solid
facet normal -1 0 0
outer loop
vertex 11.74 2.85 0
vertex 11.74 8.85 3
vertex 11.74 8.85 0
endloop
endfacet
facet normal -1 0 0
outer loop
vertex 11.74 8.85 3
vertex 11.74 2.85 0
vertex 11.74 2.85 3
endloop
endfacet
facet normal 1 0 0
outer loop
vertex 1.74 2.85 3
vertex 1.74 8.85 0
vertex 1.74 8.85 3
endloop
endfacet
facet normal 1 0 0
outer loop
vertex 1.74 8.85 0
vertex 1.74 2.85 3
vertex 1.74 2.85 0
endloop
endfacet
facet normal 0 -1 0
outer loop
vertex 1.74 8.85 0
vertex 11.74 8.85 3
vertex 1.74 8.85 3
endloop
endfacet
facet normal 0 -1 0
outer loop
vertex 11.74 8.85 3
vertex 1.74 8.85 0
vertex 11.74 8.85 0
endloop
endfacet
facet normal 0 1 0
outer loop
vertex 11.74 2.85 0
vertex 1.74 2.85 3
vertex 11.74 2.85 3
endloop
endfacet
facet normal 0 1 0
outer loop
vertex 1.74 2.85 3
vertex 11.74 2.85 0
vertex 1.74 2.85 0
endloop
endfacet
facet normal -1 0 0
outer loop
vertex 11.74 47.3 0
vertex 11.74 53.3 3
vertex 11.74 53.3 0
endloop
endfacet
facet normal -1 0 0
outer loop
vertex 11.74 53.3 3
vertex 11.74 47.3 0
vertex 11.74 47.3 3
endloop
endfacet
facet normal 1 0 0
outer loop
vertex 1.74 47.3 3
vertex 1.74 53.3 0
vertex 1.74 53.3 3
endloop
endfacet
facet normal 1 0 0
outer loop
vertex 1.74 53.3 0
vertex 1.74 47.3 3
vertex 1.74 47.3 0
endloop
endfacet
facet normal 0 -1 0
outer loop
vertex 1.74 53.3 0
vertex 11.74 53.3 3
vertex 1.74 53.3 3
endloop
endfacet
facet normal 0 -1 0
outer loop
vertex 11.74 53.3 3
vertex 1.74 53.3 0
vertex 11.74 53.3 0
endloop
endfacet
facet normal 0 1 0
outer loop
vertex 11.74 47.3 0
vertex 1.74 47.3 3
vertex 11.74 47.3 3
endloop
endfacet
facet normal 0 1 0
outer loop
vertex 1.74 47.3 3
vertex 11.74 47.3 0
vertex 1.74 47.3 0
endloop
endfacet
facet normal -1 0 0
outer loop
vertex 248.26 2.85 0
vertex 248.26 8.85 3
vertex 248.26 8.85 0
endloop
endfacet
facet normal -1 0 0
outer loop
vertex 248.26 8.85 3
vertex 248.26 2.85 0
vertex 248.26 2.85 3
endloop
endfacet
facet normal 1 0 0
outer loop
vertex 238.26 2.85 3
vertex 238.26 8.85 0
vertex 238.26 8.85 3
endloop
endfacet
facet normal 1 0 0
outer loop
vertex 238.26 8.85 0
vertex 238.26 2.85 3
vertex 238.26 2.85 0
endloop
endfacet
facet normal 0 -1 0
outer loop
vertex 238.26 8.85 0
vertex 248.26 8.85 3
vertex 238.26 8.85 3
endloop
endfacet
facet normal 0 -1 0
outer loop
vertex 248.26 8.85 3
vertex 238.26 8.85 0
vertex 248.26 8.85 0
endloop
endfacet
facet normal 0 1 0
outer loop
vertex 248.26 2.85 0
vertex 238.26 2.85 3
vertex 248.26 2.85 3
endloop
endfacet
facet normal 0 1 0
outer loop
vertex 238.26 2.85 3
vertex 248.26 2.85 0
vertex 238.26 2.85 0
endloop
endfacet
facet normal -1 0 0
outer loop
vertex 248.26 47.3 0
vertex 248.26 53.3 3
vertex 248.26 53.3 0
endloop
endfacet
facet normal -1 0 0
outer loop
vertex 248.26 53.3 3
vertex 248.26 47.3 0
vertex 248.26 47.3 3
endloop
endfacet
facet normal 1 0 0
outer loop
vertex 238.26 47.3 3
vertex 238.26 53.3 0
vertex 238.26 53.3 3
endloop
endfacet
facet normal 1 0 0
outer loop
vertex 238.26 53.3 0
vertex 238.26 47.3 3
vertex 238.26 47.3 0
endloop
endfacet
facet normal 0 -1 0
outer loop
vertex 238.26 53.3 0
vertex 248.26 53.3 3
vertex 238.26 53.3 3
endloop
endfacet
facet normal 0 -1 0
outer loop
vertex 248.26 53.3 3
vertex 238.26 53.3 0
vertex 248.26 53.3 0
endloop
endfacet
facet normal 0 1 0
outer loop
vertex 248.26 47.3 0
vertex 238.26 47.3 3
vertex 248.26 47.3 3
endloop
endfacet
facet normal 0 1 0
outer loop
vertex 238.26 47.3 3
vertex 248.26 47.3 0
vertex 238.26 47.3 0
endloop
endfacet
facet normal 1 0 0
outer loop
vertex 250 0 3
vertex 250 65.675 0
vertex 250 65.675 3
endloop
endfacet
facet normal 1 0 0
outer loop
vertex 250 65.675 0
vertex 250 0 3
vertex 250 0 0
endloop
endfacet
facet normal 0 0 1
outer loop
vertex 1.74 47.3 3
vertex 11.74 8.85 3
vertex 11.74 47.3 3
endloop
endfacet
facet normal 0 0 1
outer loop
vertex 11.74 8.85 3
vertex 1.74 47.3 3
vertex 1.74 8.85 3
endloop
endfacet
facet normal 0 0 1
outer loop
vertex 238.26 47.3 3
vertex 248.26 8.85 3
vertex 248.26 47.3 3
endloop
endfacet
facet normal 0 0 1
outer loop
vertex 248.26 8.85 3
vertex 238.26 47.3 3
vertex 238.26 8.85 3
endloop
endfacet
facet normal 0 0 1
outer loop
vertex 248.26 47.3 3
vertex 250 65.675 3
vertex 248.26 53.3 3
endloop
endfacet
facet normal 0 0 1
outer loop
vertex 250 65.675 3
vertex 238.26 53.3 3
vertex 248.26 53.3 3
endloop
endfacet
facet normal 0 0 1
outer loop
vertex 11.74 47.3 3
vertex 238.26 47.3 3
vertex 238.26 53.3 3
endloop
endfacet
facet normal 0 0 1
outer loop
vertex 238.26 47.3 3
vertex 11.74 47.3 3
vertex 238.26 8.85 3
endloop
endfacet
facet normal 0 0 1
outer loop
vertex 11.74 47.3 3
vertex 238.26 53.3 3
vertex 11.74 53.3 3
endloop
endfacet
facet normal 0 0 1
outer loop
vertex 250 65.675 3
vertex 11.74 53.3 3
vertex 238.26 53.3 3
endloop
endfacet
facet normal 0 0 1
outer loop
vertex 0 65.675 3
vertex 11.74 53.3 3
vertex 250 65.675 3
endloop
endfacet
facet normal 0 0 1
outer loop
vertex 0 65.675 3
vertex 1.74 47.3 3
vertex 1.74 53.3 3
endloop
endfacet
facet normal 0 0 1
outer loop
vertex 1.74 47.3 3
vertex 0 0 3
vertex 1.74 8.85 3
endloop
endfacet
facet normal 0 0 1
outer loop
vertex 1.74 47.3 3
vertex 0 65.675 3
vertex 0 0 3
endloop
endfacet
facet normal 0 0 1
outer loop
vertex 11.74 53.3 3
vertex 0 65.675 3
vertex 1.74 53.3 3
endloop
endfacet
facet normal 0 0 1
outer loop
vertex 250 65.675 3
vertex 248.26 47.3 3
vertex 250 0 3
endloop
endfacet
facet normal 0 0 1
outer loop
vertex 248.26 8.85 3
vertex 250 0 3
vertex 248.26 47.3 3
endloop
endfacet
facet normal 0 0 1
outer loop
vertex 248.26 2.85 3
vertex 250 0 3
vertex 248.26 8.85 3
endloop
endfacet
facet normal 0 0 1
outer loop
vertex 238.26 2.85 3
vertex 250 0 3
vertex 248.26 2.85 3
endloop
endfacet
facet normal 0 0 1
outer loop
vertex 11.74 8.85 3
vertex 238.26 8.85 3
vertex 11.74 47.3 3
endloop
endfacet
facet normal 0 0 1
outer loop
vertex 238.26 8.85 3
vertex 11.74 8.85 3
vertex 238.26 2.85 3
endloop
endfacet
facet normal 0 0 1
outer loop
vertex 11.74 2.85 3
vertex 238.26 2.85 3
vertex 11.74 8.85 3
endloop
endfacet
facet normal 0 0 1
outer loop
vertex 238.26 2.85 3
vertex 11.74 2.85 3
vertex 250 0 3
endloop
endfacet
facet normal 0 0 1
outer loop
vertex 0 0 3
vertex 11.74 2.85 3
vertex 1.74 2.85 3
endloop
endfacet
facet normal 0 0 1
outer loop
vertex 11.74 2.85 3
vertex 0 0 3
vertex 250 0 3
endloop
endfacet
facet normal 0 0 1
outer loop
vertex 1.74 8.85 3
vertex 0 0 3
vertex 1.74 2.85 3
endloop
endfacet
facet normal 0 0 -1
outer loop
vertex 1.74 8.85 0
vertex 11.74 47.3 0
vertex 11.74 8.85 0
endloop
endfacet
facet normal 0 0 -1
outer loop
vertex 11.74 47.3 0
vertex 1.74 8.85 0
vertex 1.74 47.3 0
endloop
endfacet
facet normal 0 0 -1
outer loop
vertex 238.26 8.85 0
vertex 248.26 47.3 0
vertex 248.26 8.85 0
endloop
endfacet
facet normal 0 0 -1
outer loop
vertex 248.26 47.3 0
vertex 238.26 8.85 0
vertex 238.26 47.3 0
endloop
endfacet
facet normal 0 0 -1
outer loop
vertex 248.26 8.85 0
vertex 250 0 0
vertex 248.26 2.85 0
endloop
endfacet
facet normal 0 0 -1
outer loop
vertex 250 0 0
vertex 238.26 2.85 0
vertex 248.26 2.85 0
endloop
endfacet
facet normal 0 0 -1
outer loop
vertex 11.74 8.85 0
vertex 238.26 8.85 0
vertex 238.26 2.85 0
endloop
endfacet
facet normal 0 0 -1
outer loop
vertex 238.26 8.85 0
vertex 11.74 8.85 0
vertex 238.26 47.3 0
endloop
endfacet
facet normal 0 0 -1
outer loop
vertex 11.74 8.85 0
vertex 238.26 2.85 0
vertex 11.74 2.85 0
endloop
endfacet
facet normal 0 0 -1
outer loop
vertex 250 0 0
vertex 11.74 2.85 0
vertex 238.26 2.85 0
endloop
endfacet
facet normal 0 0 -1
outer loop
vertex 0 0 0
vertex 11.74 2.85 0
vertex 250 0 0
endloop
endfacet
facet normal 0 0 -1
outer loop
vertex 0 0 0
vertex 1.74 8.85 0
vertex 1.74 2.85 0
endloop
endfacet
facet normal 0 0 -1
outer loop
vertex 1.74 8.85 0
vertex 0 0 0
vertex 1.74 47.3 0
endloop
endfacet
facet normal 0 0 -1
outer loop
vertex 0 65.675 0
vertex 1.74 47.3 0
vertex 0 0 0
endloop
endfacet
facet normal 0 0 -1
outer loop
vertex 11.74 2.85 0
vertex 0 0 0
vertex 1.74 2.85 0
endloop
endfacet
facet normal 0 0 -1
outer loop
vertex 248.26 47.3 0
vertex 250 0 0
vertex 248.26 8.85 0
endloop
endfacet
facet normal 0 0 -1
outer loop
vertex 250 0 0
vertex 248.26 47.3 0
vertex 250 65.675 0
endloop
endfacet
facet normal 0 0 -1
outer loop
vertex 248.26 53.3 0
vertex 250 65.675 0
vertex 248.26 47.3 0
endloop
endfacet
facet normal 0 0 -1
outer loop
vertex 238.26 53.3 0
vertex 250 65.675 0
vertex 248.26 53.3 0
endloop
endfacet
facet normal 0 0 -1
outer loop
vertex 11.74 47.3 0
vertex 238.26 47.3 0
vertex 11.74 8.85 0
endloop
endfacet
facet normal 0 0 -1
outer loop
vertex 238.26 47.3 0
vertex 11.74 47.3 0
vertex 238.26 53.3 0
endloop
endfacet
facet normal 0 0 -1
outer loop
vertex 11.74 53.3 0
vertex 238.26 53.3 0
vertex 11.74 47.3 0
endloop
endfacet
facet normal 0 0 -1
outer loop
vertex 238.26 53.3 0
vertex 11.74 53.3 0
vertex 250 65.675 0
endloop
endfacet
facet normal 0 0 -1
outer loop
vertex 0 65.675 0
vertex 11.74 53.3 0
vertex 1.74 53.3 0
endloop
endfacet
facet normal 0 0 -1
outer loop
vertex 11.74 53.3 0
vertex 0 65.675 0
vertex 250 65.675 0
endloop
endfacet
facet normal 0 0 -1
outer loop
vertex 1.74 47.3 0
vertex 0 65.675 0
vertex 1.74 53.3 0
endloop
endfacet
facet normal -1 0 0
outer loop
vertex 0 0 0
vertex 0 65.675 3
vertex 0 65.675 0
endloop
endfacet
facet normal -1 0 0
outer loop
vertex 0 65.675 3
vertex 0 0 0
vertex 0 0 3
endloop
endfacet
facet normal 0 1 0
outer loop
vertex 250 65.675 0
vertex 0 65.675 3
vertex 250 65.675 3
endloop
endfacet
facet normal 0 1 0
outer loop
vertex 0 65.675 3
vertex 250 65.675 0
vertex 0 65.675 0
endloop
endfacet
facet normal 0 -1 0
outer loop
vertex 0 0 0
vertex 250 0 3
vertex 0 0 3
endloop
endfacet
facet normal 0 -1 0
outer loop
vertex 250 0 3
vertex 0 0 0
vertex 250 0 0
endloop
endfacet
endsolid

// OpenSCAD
// TL1_Plate_1p5U_Standard
// Homelab Rack CAD Standard v1.0 - millimeters
// Mount positions provisional: test-fit against DeskPi TL1 rail!
plate_width=250;
plate_height=65.675;
plate_thickness=3;
slot_width=10;
slot_height=6;
slot_x=[6.74,243.26];
slot_y=[5.85,50.3];
difference() {
  cube([plate_width,plate_height,plate_thickness]);
  for (x=slot_x) for (y=slot_y)
    translate([x-slot_width/2,y-slot_height/2,-0.5])
      cube([slot_width,slot_height,plate_thickness+1]);
}
